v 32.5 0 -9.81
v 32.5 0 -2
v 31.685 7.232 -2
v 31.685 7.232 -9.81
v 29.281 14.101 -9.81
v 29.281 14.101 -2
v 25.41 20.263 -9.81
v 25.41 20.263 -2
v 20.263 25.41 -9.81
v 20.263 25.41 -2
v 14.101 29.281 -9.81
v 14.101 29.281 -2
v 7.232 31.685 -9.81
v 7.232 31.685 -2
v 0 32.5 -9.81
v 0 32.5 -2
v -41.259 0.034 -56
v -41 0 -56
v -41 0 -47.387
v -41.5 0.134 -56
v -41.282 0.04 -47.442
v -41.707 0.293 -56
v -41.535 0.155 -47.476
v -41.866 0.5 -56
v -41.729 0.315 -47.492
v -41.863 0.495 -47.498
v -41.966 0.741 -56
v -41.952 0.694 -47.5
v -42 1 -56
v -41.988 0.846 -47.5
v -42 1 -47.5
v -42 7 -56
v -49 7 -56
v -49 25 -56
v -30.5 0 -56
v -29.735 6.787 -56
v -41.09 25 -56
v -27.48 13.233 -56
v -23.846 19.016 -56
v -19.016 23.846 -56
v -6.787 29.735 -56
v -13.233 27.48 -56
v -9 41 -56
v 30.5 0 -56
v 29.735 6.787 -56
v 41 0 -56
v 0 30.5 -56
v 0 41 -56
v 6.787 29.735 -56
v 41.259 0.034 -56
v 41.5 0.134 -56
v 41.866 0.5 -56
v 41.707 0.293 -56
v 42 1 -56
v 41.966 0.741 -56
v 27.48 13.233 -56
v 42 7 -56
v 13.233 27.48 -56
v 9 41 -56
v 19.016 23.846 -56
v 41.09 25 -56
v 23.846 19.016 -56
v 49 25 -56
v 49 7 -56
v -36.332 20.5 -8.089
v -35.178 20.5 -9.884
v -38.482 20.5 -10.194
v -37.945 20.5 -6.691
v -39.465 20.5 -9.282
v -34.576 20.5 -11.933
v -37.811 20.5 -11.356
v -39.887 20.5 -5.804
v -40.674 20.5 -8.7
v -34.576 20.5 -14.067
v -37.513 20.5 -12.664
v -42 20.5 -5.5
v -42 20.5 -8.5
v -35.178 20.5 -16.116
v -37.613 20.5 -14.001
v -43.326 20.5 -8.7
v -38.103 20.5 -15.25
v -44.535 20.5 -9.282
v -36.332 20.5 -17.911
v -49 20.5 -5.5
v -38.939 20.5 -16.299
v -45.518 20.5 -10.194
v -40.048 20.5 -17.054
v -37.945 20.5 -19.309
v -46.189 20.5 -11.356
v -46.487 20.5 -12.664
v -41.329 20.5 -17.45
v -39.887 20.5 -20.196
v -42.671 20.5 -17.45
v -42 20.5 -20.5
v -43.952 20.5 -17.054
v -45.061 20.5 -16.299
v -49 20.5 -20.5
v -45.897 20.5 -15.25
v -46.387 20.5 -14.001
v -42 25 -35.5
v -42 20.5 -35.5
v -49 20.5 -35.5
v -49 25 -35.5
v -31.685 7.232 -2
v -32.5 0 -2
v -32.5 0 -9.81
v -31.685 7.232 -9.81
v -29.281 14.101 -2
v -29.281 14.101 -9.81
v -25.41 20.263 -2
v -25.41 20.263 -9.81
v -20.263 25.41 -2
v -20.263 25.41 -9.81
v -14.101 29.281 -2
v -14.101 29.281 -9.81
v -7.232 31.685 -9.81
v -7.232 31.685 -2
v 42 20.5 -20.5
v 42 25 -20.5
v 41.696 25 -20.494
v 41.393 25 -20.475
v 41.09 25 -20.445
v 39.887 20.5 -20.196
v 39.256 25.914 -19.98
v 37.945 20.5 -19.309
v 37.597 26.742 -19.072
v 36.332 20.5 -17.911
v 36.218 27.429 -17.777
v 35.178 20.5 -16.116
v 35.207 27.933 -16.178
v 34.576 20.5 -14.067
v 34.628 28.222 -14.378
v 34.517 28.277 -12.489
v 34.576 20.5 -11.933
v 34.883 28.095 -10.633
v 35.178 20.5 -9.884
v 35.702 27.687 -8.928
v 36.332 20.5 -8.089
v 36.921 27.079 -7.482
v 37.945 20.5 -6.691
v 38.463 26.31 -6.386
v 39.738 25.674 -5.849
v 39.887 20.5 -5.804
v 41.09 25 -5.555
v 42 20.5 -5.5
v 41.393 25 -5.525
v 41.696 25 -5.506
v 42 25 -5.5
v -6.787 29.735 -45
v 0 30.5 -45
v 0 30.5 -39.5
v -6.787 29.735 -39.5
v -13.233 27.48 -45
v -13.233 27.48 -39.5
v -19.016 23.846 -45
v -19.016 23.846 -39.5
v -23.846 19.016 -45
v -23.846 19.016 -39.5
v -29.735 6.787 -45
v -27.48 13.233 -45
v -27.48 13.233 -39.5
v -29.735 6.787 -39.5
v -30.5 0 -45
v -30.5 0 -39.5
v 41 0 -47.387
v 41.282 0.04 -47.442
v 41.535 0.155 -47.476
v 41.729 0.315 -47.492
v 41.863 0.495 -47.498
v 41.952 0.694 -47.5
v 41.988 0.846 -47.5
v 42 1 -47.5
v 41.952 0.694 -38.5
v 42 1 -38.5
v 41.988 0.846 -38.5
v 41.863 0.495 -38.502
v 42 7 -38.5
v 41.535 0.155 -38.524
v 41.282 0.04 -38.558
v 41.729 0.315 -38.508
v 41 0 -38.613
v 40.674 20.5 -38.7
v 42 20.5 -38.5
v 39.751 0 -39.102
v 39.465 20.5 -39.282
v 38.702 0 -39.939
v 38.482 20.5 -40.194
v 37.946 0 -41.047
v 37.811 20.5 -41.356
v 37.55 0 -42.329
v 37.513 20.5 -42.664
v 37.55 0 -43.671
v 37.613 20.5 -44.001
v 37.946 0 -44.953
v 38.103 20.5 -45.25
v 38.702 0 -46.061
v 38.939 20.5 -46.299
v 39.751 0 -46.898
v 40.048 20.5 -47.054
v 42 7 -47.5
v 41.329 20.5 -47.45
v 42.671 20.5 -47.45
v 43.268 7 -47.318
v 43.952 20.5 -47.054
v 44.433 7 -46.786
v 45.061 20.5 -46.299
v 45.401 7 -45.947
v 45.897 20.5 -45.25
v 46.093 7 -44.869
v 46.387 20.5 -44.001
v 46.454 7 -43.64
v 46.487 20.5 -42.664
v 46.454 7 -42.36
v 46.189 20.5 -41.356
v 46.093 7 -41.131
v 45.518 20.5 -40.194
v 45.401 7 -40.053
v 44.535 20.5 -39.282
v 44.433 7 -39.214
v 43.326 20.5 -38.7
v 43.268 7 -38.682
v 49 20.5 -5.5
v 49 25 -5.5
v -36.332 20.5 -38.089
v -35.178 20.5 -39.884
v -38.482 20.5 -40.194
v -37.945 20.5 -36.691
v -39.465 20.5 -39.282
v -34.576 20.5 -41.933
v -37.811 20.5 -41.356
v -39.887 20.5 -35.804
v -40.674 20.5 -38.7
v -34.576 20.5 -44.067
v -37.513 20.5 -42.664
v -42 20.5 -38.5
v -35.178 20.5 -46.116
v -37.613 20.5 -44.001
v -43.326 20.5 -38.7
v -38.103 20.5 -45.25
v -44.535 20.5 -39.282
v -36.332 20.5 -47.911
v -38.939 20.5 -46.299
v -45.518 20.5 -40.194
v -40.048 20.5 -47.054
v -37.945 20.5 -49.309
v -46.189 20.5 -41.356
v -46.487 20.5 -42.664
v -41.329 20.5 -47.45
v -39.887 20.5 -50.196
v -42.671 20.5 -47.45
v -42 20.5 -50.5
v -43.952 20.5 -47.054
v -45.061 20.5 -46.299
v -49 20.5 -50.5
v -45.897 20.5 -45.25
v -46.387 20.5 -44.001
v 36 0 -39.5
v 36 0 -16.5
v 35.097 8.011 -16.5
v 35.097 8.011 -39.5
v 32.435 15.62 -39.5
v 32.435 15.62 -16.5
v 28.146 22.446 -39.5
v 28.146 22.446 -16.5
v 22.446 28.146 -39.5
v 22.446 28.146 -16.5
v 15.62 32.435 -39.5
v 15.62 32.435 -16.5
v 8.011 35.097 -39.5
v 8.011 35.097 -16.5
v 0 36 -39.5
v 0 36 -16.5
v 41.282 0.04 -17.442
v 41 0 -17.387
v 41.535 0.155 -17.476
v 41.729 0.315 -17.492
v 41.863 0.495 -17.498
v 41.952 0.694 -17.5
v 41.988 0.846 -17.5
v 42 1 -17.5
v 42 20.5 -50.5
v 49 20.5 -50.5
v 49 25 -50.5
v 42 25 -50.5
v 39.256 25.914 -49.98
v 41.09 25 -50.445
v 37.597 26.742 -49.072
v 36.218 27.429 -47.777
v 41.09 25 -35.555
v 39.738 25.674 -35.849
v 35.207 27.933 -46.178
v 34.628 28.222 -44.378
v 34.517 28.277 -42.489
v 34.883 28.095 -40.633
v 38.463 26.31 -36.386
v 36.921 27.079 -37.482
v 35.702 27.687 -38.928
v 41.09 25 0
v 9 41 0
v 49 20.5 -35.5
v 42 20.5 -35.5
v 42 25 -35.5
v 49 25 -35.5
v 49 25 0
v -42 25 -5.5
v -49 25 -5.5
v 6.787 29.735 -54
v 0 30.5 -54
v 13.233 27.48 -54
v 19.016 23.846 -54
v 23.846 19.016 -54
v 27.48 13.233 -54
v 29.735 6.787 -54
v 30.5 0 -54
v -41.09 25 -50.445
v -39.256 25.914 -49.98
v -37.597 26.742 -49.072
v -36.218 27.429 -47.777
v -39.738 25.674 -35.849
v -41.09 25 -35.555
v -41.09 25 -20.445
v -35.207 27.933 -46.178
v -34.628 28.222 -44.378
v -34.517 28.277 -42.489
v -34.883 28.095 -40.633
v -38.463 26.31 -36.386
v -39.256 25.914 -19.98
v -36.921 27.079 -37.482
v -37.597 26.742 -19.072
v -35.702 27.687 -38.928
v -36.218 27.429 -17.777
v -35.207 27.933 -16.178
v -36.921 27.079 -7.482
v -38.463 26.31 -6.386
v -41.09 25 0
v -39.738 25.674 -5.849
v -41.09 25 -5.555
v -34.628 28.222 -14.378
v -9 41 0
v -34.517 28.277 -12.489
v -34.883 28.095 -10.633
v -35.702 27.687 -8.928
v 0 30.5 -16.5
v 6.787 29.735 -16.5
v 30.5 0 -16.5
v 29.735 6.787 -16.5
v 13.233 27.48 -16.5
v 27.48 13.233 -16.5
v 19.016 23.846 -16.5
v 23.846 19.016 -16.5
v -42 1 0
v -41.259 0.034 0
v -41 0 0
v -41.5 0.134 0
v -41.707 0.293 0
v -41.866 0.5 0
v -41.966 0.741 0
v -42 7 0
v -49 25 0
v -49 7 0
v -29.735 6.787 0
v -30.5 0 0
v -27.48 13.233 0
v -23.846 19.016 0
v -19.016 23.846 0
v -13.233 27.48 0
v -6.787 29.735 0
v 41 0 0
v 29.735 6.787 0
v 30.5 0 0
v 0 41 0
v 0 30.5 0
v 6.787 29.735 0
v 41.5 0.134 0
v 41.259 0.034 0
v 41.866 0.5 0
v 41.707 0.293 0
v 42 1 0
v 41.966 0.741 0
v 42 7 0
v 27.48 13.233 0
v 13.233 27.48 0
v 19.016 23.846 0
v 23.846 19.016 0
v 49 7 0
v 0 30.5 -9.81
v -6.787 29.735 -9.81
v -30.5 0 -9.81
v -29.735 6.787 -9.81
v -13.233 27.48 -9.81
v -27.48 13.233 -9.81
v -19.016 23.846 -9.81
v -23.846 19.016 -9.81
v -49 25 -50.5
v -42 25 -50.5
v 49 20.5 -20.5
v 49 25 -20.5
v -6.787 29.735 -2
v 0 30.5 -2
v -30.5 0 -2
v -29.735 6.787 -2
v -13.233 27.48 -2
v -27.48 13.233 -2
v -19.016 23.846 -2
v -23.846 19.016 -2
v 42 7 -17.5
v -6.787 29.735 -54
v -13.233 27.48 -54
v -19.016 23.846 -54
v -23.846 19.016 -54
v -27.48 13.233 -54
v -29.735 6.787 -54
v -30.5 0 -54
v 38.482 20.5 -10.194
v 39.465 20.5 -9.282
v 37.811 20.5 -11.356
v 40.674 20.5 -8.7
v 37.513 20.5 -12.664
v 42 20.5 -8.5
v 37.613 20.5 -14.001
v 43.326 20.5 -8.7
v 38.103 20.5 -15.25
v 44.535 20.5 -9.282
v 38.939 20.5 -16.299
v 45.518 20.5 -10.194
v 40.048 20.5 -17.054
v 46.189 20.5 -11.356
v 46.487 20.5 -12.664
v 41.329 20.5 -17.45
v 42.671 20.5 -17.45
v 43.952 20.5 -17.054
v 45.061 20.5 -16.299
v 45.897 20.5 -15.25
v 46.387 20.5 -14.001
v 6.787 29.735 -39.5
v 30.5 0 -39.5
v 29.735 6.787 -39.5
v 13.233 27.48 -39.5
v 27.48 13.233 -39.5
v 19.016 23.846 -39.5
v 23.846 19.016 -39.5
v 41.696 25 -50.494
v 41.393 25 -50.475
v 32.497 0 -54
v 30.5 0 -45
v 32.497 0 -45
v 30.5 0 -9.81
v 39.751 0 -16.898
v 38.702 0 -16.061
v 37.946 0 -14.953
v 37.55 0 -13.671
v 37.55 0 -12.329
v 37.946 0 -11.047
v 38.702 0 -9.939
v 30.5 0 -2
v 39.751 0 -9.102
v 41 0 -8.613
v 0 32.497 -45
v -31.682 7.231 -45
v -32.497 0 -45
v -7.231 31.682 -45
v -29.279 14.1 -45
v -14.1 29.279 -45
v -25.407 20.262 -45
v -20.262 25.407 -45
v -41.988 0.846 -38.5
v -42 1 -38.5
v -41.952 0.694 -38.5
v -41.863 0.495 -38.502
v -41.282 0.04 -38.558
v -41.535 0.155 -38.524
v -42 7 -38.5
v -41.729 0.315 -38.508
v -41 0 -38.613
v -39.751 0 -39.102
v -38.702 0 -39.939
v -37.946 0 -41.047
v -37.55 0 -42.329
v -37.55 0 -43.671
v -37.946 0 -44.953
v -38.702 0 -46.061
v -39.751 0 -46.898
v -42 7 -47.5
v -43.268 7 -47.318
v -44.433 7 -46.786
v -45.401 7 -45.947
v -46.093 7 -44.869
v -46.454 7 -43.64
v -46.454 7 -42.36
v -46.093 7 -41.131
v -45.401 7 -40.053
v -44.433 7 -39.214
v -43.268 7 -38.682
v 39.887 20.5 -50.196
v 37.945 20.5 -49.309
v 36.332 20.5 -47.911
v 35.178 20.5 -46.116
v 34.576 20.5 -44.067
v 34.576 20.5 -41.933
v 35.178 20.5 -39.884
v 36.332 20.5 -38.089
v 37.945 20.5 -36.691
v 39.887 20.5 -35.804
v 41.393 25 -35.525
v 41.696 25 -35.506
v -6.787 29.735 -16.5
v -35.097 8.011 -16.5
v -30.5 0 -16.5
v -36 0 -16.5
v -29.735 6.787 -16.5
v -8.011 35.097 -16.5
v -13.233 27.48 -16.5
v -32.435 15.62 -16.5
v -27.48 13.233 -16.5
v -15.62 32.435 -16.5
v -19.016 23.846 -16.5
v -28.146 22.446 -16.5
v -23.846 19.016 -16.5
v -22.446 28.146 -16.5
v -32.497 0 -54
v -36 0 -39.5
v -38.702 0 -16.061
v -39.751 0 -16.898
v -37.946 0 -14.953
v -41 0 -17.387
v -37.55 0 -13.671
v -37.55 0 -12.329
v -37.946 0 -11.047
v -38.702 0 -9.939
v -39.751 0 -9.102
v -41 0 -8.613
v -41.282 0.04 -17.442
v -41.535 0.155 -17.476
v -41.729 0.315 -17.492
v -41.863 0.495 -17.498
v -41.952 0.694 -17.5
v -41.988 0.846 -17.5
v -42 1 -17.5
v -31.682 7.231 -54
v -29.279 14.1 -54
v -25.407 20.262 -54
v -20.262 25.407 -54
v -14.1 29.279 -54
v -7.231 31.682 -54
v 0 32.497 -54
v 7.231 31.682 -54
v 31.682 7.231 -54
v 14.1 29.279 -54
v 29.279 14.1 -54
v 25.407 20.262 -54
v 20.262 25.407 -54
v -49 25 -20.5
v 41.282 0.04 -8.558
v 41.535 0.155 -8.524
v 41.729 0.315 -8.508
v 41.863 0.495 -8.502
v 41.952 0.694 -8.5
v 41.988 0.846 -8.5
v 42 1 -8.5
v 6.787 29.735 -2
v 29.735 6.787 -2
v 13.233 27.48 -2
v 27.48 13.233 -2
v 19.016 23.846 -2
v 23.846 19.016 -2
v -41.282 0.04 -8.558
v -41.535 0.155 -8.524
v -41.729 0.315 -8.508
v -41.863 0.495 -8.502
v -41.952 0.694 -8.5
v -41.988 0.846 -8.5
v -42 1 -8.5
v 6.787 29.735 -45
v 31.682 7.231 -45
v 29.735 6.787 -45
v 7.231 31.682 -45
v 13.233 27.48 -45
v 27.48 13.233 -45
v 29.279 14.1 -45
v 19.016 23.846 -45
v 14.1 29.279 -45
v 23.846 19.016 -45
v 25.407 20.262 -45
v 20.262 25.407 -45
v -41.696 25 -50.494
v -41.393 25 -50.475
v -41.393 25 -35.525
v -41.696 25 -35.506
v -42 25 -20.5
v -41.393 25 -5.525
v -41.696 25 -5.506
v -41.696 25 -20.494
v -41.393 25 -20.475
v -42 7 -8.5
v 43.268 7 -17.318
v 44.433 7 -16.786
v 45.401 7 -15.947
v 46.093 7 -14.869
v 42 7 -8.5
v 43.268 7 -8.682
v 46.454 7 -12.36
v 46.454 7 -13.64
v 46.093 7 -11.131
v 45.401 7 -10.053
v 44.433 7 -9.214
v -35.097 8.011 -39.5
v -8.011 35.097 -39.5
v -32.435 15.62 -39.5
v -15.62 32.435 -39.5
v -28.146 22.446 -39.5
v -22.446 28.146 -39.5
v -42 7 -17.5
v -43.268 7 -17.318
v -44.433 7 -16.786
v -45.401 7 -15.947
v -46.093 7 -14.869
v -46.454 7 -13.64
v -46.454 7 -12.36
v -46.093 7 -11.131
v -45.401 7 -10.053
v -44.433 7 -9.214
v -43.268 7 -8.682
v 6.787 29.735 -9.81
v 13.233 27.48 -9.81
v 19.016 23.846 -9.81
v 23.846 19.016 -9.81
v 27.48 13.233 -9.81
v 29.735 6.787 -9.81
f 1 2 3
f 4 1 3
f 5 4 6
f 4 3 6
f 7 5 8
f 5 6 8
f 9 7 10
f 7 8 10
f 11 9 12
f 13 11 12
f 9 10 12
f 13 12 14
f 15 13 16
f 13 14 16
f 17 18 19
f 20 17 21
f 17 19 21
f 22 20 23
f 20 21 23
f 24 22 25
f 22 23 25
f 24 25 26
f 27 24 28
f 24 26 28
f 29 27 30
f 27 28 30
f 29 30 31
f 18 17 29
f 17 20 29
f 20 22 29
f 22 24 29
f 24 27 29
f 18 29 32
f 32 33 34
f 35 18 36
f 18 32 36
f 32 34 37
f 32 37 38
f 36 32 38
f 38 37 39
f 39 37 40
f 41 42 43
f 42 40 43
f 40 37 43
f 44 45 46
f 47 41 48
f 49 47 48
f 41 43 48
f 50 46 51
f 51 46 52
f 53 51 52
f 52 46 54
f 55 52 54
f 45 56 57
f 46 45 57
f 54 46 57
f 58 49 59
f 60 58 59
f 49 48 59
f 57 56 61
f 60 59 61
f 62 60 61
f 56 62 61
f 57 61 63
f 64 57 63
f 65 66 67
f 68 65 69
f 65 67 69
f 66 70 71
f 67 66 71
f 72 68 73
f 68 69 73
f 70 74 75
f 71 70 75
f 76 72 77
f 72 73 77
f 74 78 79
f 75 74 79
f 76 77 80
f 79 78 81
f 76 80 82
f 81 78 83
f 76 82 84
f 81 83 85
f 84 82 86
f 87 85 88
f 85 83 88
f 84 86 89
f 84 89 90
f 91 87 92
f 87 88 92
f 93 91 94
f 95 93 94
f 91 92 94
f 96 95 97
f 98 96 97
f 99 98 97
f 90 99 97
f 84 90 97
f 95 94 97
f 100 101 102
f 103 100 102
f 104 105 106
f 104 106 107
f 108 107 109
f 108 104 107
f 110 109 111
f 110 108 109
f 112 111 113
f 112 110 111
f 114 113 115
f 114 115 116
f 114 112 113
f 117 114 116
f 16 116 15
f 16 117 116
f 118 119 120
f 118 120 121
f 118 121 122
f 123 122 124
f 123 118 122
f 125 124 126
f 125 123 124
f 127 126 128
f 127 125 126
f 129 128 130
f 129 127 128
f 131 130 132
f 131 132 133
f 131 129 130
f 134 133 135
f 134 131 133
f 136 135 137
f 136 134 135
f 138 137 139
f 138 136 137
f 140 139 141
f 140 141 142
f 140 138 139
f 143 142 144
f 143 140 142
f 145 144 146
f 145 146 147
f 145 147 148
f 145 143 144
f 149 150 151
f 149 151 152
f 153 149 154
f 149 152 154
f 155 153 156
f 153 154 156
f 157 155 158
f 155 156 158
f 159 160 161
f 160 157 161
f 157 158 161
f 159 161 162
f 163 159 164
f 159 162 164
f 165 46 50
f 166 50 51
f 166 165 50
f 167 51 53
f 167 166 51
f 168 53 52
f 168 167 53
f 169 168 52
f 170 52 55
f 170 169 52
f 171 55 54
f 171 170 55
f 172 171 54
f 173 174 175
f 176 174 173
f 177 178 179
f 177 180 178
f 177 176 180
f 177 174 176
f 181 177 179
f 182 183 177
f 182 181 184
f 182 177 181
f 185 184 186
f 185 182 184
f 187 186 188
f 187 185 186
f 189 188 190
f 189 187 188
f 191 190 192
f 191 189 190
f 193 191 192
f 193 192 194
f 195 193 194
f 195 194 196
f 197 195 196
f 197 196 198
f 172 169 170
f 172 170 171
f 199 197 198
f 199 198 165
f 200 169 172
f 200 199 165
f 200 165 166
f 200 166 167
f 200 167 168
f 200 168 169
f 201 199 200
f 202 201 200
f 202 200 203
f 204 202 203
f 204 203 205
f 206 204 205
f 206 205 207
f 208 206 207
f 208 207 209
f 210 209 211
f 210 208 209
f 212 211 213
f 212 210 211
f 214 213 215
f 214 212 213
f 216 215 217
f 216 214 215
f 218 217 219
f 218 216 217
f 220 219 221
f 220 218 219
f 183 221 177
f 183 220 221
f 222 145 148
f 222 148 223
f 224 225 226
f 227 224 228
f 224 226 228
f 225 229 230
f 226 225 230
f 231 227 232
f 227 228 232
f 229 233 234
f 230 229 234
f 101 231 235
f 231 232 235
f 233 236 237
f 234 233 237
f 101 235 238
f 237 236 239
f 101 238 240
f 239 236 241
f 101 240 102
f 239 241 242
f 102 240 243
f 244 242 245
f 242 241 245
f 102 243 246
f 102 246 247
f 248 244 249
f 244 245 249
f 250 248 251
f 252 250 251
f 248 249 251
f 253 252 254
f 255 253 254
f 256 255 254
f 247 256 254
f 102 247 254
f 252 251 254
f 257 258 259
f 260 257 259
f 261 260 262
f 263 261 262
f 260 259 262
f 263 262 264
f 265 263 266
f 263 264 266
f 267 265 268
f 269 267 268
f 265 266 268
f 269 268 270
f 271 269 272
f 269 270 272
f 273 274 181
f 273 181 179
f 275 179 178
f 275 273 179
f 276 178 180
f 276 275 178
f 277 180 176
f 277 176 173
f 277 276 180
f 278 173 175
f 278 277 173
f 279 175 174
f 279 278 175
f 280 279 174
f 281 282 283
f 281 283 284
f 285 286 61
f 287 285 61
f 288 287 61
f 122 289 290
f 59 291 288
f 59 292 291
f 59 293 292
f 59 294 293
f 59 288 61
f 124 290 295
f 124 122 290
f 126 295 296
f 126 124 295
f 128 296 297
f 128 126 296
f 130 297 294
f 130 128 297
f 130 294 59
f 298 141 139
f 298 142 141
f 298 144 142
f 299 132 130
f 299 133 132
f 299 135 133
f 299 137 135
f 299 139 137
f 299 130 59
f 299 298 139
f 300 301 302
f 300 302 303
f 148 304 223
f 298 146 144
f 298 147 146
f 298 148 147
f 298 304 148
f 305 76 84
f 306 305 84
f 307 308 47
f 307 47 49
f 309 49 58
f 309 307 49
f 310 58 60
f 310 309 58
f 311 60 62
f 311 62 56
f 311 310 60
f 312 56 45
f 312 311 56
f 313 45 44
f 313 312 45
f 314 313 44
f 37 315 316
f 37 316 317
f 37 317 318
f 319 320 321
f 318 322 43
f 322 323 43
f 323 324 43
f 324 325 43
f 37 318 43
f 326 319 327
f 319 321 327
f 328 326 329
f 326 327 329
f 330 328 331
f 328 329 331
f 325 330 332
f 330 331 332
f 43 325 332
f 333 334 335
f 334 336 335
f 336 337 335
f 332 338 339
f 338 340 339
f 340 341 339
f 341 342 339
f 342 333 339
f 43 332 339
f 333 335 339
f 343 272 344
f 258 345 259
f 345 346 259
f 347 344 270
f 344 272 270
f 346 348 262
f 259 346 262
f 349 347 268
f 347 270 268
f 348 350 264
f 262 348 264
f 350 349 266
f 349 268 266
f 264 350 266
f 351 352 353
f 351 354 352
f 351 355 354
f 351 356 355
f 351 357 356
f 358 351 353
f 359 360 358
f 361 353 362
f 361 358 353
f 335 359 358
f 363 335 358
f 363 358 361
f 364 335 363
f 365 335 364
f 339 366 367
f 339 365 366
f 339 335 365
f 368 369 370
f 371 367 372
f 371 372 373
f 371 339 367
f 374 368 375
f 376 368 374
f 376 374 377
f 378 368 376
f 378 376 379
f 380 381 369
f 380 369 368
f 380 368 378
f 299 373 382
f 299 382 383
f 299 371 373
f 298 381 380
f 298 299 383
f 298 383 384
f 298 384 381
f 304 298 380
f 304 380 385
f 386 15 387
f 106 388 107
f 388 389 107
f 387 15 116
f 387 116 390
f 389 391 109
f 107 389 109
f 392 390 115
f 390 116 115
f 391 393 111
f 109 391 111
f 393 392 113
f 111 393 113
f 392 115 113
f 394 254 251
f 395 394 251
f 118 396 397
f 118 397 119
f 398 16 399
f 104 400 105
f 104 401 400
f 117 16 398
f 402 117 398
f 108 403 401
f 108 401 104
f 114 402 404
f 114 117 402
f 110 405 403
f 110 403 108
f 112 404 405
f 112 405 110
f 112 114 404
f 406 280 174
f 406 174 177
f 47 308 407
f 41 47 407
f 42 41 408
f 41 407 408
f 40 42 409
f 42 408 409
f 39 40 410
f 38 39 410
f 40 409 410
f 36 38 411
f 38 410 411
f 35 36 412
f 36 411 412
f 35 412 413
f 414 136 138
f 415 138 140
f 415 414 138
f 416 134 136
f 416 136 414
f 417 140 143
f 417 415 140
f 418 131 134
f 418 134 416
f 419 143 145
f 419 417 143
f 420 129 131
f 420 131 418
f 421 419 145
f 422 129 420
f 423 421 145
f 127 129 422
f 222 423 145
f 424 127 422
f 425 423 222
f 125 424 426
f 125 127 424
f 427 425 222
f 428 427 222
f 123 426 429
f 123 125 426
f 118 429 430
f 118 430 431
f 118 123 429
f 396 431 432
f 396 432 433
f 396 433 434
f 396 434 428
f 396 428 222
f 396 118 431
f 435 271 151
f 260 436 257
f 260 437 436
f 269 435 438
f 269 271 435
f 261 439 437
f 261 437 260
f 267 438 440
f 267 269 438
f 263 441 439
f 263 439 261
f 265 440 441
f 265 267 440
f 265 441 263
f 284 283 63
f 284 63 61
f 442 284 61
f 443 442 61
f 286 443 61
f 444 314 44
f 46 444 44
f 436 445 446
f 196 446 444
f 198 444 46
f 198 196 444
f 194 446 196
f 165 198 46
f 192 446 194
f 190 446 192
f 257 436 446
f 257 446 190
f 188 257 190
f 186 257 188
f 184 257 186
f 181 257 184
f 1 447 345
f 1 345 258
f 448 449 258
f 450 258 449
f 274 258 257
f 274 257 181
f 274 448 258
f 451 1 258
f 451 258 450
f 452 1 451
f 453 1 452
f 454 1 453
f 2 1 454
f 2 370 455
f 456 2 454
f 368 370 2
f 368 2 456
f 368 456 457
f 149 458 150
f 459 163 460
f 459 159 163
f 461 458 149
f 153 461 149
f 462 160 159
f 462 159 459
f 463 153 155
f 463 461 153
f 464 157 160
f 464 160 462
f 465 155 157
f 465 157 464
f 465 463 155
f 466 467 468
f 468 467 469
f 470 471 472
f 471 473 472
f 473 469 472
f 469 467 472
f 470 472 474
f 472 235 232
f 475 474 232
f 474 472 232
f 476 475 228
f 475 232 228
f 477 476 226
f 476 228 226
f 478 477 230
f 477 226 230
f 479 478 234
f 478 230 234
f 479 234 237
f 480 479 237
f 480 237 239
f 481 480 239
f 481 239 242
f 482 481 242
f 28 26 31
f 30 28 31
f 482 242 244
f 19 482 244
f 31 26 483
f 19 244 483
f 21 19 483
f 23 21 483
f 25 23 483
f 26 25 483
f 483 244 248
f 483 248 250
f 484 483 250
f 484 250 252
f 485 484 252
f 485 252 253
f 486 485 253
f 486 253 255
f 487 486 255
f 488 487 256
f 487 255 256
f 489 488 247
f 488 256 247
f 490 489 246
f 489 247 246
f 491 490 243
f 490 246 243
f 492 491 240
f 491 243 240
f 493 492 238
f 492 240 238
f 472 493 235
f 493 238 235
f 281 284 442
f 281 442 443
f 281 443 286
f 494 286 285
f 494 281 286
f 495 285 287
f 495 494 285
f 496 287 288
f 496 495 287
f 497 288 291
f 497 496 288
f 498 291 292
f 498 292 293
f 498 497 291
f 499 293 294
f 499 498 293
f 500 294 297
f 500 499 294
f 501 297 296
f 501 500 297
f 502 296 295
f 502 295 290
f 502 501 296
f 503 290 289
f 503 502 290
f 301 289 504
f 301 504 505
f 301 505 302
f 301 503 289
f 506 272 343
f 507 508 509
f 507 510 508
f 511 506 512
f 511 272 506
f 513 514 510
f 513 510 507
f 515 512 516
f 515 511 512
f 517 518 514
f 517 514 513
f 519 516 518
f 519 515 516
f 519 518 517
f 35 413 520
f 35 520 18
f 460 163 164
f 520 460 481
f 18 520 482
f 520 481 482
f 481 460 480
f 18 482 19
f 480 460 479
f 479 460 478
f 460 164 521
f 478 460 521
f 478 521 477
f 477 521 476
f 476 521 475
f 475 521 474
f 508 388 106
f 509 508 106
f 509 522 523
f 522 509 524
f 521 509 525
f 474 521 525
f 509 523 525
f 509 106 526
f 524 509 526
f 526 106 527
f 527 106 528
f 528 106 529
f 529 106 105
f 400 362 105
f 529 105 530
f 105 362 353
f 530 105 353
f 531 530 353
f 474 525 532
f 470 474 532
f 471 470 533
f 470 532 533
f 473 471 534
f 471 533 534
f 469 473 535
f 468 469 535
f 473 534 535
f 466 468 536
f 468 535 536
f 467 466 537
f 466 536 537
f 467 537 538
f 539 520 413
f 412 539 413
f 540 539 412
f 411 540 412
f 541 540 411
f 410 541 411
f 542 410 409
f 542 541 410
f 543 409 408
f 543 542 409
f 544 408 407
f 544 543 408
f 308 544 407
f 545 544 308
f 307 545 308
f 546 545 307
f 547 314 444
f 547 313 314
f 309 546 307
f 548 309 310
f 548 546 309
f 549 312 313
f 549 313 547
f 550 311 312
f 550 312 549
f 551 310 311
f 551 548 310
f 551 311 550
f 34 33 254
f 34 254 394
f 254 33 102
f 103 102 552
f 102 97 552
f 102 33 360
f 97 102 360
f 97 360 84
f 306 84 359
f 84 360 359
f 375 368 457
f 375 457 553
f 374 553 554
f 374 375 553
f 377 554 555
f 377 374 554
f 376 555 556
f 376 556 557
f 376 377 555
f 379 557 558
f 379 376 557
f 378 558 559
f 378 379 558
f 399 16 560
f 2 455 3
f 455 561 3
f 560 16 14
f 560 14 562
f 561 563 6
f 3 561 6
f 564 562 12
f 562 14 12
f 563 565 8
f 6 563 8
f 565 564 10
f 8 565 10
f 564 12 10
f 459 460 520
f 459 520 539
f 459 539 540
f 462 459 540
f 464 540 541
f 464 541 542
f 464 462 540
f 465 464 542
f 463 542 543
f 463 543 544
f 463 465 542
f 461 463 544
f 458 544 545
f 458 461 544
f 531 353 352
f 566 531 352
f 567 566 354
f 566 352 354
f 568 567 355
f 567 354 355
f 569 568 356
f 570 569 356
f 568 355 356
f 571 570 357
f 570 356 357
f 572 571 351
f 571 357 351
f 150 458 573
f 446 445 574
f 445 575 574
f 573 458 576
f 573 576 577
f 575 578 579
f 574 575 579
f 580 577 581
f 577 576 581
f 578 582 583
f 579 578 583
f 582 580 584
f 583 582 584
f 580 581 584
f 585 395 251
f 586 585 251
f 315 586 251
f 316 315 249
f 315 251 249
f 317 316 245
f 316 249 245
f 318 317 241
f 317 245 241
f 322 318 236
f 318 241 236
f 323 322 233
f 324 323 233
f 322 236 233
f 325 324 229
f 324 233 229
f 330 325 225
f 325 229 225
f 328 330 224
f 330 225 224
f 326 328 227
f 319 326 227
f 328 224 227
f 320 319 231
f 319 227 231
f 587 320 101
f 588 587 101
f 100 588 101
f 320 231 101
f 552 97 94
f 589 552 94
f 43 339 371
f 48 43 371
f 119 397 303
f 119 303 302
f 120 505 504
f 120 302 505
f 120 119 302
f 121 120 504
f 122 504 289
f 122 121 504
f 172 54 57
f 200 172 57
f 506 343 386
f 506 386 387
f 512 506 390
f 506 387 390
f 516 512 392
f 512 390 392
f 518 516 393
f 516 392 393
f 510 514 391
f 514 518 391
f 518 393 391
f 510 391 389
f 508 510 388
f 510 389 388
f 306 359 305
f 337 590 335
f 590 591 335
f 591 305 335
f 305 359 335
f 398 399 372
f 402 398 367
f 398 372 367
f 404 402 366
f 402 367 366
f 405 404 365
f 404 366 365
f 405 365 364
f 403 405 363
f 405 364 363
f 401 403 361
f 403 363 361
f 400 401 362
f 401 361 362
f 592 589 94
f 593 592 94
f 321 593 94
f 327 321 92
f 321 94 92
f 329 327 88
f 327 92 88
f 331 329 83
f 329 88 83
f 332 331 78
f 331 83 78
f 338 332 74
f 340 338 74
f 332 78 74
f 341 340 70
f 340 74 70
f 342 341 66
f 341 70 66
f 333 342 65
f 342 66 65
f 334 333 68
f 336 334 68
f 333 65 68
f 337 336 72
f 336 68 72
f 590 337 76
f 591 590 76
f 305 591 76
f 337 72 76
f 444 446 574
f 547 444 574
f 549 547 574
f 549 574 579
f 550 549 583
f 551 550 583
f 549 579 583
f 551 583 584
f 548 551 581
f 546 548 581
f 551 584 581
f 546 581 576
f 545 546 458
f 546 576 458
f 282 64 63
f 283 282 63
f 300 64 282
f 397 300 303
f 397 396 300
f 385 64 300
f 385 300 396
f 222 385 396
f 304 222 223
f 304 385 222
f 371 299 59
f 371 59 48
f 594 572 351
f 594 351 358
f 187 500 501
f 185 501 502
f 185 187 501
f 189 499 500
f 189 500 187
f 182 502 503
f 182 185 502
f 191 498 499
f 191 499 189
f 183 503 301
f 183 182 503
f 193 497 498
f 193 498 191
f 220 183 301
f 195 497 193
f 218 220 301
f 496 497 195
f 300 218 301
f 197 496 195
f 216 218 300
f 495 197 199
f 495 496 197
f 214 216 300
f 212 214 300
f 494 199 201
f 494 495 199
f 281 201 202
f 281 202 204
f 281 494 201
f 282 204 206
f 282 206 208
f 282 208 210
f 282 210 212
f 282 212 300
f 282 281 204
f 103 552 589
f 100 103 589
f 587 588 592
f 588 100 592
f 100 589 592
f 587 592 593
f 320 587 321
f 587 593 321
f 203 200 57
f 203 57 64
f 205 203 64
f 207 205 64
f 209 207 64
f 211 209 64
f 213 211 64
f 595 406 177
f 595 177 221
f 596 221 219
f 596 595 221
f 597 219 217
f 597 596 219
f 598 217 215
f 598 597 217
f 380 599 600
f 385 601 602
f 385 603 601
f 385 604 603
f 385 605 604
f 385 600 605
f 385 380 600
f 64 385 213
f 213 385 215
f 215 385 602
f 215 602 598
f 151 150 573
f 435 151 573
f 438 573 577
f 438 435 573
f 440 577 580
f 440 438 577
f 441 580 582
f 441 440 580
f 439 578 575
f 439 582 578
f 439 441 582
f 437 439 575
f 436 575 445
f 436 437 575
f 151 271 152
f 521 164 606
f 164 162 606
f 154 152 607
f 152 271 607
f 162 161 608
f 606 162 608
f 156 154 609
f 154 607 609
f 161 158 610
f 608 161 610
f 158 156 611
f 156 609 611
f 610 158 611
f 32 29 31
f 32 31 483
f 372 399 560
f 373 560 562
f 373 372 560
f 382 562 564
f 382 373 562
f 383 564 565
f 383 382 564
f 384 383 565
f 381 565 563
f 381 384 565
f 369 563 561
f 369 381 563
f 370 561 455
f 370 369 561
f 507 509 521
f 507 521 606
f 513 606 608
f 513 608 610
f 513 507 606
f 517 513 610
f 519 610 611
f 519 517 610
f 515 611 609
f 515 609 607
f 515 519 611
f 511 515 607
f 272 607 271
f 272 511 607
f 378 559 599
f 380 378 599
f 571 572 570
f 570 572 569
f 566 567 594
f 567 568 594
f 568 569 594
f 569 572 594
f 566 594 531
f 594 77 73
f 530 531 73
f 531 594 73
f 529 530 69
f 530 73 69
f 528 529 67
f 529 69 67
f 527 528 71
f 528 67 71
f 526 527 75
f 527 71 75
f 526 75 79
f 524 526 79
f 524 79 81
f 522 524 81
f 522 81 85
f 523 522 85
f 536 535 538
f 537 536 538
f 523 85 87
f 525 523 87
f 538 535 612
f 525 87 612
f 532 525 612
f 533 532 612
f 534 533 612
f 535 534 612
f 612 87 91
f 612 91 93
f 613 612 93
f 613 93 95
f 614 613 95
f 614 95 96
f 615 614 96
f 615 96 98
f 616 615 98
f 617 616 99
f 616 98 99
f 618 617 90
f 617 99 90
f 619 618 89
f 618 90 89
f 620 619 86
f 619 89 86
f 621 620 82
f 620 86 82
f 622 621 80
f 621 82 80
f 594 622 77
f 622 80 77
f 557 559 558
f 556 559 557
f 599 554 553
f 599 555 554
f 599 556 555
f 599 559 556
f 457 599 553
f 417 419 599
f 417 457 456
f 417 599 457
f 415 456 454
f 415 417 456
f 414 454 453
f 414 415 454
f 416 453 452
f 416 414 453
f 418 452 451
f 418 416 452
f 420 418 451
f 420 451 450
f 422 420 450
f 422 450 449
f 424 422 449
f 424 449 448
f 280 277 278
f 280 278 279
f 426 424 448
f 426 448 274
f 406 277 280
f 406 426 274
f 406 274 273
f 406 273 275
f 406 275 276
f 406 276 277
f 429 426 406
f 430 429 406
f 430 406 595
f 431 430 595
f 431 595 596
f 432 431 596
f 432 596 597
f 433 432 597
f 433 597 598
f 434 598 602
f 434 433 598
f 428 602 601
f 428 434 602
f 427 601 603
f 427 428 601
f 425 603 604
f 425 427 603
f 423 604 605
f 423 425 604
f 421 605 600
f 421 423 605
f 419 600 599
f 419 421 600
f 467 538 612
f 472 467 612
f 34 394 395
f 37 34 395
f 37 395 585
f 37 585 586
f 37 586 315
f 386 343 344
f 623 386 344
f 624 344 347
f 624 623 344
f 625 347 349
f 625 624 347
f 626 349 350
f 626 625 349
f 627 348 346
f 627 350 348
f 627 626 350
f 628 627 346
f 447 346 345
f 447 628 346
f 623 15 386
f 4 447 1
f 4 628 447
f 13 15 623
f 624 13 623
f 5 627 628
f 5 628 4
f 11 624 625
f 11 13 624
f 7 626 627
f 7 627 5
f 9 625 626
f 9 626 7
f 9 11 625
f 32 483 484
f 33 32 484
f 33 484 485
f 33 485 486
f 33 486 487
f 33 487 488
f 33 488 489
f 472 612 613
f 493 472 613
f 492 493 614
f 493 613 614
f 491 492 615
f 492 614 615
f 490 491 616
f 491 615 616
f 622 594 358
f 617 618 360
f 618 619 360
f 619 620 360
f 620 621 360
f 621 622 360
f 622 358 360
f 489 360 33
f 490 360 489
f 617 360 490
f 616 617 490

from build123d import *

# Parameters (mm, degrees)
BOSS_EXTRUDE1_DEPTH     = 56
SKETCH2_W               = 2
SKETCH2_H               = 7.81
SKETCH2_W_2             = 5.5
SKETCH2_H_2             = 23
SKETCH2_W_3             = 1.997029369
SKETCH2_H_3             = 9
CUT_EXTRUDE1_DEPTH      = 79.498407627
CUT_EXTRUDE1_DEPTH_BACK = 4.5
SKETCH5_R               = 4.5
CUT_EXTRUDE2_DEPTH      = 78.183223566


with BuildPart() as part:
    # Sketch1 → Boss-Extrude1 (new body)
    with BuildSketch(Plane.XY):
        with BuildLine():
            Line((-30.5, 0), (-41, 0))
            ThreePointArc((-41, 0), (-41.707106781, 0.292893219), (-42, 1))
            Line((-42, 1), (-42, 7))
            Line((-42, 7), (-49, 7))
            Line((-49, 7), (-49, 25))
            Line((-49, 25), (-41.09, 25))
            Line((-41.09, 25), (-9, 41))
            Line((-9, 41), (0, 41))
            Line((0, 41), (0, 30.5))
            ThreePointArc((0, 30.5), (-21.566756826, 21.566756826), (-30.5, 0))
        make_face()
    extrude(amount=-BOSS_EXTRUDE1_DEPTH)

    # Sketch2 → Cut-Revolve6 (revolve, cut)
    with BuildSketch(Plane.XZ):
        with Locations((-31.5, -5.905)):
            Rectangle(SKETCH2_W, SKETCH2_H)
        with Locations((-33.25, -28)):
            Rectangle(SKETCH2_W_2, SKETCH2_H_2)
        with Locations((-31.498514685, -49.5)):
            Rectangle(SKETCH2_W_3, SKETCH2_H_3)
    revolve(axis=Axis((0, 0, 0), (0, 0, -1)), mode=Mode.SUBTRACT)

    # Sketch4 → Cut-Extrude1 (cut, two sides: drawn at the far end of the back side and taken through both)
    with BuildSketch(Plane(origin=(0, 25, 0), x_dir=(1, 0, 0), z_dir=(0, 1, 0)).offset(-CUT_EXTRUDE1_DEPTH_BACK)):
        with BuildLine():
            Line((-49, 50.5), (-42, 50.5))
            ThreePointArc((-42, 50.5), (-34.5, 43), (-42, 35.5))
            Line((-42, 35.5), (-49, 35.5))
            Line((-49, 35.5), (-49, 50.5))
        make_face()
        with BuildLine():
            Line((-49, 20.5), (-42, 20.5))
            ThreePointArc((-42, 20.5), (-34.5, 13), (-42, 5.5))
            Line((-42, 5.5), (-49, 5.5))
            Line((-49, 5.5), (-49, 20.5))
        make_face()
    extrude(amount=CUT_EXTRUDE1_DEPTH + CUT_EXTRUDE1_DEPTH_BACK, mode=Mode.SUBTRACT)

    # Sketch5 → Cut-Extrude2 (cut, through all)
    with BuildSketch(Plane(origin=(0, 20.5, 0), x_dir=(1, 0, 0), z_dir=(0, 1, 0))):
        with Locations(Location((-42, 13, 0), (0, 0, 270))):
            Circle(SKETCH5_R)
        with Locations(Location((-42, 43, 0), (0, 0, 270))):
            Circle(SKETCH5_R)
    extrude(amount=-CUT_EXTRUDE2_DEPTH, mode=Mode.SUBTRACT)

    # Mirror1: part across plane


with BuildPart() as part_1:
    add(part.part)
    add(part.part.mirror(Plane(origin=(0, 41, -56), x_dir=(0, 0, 1), z_dir=(-1, 0, 0))))


solid = part_1.part
